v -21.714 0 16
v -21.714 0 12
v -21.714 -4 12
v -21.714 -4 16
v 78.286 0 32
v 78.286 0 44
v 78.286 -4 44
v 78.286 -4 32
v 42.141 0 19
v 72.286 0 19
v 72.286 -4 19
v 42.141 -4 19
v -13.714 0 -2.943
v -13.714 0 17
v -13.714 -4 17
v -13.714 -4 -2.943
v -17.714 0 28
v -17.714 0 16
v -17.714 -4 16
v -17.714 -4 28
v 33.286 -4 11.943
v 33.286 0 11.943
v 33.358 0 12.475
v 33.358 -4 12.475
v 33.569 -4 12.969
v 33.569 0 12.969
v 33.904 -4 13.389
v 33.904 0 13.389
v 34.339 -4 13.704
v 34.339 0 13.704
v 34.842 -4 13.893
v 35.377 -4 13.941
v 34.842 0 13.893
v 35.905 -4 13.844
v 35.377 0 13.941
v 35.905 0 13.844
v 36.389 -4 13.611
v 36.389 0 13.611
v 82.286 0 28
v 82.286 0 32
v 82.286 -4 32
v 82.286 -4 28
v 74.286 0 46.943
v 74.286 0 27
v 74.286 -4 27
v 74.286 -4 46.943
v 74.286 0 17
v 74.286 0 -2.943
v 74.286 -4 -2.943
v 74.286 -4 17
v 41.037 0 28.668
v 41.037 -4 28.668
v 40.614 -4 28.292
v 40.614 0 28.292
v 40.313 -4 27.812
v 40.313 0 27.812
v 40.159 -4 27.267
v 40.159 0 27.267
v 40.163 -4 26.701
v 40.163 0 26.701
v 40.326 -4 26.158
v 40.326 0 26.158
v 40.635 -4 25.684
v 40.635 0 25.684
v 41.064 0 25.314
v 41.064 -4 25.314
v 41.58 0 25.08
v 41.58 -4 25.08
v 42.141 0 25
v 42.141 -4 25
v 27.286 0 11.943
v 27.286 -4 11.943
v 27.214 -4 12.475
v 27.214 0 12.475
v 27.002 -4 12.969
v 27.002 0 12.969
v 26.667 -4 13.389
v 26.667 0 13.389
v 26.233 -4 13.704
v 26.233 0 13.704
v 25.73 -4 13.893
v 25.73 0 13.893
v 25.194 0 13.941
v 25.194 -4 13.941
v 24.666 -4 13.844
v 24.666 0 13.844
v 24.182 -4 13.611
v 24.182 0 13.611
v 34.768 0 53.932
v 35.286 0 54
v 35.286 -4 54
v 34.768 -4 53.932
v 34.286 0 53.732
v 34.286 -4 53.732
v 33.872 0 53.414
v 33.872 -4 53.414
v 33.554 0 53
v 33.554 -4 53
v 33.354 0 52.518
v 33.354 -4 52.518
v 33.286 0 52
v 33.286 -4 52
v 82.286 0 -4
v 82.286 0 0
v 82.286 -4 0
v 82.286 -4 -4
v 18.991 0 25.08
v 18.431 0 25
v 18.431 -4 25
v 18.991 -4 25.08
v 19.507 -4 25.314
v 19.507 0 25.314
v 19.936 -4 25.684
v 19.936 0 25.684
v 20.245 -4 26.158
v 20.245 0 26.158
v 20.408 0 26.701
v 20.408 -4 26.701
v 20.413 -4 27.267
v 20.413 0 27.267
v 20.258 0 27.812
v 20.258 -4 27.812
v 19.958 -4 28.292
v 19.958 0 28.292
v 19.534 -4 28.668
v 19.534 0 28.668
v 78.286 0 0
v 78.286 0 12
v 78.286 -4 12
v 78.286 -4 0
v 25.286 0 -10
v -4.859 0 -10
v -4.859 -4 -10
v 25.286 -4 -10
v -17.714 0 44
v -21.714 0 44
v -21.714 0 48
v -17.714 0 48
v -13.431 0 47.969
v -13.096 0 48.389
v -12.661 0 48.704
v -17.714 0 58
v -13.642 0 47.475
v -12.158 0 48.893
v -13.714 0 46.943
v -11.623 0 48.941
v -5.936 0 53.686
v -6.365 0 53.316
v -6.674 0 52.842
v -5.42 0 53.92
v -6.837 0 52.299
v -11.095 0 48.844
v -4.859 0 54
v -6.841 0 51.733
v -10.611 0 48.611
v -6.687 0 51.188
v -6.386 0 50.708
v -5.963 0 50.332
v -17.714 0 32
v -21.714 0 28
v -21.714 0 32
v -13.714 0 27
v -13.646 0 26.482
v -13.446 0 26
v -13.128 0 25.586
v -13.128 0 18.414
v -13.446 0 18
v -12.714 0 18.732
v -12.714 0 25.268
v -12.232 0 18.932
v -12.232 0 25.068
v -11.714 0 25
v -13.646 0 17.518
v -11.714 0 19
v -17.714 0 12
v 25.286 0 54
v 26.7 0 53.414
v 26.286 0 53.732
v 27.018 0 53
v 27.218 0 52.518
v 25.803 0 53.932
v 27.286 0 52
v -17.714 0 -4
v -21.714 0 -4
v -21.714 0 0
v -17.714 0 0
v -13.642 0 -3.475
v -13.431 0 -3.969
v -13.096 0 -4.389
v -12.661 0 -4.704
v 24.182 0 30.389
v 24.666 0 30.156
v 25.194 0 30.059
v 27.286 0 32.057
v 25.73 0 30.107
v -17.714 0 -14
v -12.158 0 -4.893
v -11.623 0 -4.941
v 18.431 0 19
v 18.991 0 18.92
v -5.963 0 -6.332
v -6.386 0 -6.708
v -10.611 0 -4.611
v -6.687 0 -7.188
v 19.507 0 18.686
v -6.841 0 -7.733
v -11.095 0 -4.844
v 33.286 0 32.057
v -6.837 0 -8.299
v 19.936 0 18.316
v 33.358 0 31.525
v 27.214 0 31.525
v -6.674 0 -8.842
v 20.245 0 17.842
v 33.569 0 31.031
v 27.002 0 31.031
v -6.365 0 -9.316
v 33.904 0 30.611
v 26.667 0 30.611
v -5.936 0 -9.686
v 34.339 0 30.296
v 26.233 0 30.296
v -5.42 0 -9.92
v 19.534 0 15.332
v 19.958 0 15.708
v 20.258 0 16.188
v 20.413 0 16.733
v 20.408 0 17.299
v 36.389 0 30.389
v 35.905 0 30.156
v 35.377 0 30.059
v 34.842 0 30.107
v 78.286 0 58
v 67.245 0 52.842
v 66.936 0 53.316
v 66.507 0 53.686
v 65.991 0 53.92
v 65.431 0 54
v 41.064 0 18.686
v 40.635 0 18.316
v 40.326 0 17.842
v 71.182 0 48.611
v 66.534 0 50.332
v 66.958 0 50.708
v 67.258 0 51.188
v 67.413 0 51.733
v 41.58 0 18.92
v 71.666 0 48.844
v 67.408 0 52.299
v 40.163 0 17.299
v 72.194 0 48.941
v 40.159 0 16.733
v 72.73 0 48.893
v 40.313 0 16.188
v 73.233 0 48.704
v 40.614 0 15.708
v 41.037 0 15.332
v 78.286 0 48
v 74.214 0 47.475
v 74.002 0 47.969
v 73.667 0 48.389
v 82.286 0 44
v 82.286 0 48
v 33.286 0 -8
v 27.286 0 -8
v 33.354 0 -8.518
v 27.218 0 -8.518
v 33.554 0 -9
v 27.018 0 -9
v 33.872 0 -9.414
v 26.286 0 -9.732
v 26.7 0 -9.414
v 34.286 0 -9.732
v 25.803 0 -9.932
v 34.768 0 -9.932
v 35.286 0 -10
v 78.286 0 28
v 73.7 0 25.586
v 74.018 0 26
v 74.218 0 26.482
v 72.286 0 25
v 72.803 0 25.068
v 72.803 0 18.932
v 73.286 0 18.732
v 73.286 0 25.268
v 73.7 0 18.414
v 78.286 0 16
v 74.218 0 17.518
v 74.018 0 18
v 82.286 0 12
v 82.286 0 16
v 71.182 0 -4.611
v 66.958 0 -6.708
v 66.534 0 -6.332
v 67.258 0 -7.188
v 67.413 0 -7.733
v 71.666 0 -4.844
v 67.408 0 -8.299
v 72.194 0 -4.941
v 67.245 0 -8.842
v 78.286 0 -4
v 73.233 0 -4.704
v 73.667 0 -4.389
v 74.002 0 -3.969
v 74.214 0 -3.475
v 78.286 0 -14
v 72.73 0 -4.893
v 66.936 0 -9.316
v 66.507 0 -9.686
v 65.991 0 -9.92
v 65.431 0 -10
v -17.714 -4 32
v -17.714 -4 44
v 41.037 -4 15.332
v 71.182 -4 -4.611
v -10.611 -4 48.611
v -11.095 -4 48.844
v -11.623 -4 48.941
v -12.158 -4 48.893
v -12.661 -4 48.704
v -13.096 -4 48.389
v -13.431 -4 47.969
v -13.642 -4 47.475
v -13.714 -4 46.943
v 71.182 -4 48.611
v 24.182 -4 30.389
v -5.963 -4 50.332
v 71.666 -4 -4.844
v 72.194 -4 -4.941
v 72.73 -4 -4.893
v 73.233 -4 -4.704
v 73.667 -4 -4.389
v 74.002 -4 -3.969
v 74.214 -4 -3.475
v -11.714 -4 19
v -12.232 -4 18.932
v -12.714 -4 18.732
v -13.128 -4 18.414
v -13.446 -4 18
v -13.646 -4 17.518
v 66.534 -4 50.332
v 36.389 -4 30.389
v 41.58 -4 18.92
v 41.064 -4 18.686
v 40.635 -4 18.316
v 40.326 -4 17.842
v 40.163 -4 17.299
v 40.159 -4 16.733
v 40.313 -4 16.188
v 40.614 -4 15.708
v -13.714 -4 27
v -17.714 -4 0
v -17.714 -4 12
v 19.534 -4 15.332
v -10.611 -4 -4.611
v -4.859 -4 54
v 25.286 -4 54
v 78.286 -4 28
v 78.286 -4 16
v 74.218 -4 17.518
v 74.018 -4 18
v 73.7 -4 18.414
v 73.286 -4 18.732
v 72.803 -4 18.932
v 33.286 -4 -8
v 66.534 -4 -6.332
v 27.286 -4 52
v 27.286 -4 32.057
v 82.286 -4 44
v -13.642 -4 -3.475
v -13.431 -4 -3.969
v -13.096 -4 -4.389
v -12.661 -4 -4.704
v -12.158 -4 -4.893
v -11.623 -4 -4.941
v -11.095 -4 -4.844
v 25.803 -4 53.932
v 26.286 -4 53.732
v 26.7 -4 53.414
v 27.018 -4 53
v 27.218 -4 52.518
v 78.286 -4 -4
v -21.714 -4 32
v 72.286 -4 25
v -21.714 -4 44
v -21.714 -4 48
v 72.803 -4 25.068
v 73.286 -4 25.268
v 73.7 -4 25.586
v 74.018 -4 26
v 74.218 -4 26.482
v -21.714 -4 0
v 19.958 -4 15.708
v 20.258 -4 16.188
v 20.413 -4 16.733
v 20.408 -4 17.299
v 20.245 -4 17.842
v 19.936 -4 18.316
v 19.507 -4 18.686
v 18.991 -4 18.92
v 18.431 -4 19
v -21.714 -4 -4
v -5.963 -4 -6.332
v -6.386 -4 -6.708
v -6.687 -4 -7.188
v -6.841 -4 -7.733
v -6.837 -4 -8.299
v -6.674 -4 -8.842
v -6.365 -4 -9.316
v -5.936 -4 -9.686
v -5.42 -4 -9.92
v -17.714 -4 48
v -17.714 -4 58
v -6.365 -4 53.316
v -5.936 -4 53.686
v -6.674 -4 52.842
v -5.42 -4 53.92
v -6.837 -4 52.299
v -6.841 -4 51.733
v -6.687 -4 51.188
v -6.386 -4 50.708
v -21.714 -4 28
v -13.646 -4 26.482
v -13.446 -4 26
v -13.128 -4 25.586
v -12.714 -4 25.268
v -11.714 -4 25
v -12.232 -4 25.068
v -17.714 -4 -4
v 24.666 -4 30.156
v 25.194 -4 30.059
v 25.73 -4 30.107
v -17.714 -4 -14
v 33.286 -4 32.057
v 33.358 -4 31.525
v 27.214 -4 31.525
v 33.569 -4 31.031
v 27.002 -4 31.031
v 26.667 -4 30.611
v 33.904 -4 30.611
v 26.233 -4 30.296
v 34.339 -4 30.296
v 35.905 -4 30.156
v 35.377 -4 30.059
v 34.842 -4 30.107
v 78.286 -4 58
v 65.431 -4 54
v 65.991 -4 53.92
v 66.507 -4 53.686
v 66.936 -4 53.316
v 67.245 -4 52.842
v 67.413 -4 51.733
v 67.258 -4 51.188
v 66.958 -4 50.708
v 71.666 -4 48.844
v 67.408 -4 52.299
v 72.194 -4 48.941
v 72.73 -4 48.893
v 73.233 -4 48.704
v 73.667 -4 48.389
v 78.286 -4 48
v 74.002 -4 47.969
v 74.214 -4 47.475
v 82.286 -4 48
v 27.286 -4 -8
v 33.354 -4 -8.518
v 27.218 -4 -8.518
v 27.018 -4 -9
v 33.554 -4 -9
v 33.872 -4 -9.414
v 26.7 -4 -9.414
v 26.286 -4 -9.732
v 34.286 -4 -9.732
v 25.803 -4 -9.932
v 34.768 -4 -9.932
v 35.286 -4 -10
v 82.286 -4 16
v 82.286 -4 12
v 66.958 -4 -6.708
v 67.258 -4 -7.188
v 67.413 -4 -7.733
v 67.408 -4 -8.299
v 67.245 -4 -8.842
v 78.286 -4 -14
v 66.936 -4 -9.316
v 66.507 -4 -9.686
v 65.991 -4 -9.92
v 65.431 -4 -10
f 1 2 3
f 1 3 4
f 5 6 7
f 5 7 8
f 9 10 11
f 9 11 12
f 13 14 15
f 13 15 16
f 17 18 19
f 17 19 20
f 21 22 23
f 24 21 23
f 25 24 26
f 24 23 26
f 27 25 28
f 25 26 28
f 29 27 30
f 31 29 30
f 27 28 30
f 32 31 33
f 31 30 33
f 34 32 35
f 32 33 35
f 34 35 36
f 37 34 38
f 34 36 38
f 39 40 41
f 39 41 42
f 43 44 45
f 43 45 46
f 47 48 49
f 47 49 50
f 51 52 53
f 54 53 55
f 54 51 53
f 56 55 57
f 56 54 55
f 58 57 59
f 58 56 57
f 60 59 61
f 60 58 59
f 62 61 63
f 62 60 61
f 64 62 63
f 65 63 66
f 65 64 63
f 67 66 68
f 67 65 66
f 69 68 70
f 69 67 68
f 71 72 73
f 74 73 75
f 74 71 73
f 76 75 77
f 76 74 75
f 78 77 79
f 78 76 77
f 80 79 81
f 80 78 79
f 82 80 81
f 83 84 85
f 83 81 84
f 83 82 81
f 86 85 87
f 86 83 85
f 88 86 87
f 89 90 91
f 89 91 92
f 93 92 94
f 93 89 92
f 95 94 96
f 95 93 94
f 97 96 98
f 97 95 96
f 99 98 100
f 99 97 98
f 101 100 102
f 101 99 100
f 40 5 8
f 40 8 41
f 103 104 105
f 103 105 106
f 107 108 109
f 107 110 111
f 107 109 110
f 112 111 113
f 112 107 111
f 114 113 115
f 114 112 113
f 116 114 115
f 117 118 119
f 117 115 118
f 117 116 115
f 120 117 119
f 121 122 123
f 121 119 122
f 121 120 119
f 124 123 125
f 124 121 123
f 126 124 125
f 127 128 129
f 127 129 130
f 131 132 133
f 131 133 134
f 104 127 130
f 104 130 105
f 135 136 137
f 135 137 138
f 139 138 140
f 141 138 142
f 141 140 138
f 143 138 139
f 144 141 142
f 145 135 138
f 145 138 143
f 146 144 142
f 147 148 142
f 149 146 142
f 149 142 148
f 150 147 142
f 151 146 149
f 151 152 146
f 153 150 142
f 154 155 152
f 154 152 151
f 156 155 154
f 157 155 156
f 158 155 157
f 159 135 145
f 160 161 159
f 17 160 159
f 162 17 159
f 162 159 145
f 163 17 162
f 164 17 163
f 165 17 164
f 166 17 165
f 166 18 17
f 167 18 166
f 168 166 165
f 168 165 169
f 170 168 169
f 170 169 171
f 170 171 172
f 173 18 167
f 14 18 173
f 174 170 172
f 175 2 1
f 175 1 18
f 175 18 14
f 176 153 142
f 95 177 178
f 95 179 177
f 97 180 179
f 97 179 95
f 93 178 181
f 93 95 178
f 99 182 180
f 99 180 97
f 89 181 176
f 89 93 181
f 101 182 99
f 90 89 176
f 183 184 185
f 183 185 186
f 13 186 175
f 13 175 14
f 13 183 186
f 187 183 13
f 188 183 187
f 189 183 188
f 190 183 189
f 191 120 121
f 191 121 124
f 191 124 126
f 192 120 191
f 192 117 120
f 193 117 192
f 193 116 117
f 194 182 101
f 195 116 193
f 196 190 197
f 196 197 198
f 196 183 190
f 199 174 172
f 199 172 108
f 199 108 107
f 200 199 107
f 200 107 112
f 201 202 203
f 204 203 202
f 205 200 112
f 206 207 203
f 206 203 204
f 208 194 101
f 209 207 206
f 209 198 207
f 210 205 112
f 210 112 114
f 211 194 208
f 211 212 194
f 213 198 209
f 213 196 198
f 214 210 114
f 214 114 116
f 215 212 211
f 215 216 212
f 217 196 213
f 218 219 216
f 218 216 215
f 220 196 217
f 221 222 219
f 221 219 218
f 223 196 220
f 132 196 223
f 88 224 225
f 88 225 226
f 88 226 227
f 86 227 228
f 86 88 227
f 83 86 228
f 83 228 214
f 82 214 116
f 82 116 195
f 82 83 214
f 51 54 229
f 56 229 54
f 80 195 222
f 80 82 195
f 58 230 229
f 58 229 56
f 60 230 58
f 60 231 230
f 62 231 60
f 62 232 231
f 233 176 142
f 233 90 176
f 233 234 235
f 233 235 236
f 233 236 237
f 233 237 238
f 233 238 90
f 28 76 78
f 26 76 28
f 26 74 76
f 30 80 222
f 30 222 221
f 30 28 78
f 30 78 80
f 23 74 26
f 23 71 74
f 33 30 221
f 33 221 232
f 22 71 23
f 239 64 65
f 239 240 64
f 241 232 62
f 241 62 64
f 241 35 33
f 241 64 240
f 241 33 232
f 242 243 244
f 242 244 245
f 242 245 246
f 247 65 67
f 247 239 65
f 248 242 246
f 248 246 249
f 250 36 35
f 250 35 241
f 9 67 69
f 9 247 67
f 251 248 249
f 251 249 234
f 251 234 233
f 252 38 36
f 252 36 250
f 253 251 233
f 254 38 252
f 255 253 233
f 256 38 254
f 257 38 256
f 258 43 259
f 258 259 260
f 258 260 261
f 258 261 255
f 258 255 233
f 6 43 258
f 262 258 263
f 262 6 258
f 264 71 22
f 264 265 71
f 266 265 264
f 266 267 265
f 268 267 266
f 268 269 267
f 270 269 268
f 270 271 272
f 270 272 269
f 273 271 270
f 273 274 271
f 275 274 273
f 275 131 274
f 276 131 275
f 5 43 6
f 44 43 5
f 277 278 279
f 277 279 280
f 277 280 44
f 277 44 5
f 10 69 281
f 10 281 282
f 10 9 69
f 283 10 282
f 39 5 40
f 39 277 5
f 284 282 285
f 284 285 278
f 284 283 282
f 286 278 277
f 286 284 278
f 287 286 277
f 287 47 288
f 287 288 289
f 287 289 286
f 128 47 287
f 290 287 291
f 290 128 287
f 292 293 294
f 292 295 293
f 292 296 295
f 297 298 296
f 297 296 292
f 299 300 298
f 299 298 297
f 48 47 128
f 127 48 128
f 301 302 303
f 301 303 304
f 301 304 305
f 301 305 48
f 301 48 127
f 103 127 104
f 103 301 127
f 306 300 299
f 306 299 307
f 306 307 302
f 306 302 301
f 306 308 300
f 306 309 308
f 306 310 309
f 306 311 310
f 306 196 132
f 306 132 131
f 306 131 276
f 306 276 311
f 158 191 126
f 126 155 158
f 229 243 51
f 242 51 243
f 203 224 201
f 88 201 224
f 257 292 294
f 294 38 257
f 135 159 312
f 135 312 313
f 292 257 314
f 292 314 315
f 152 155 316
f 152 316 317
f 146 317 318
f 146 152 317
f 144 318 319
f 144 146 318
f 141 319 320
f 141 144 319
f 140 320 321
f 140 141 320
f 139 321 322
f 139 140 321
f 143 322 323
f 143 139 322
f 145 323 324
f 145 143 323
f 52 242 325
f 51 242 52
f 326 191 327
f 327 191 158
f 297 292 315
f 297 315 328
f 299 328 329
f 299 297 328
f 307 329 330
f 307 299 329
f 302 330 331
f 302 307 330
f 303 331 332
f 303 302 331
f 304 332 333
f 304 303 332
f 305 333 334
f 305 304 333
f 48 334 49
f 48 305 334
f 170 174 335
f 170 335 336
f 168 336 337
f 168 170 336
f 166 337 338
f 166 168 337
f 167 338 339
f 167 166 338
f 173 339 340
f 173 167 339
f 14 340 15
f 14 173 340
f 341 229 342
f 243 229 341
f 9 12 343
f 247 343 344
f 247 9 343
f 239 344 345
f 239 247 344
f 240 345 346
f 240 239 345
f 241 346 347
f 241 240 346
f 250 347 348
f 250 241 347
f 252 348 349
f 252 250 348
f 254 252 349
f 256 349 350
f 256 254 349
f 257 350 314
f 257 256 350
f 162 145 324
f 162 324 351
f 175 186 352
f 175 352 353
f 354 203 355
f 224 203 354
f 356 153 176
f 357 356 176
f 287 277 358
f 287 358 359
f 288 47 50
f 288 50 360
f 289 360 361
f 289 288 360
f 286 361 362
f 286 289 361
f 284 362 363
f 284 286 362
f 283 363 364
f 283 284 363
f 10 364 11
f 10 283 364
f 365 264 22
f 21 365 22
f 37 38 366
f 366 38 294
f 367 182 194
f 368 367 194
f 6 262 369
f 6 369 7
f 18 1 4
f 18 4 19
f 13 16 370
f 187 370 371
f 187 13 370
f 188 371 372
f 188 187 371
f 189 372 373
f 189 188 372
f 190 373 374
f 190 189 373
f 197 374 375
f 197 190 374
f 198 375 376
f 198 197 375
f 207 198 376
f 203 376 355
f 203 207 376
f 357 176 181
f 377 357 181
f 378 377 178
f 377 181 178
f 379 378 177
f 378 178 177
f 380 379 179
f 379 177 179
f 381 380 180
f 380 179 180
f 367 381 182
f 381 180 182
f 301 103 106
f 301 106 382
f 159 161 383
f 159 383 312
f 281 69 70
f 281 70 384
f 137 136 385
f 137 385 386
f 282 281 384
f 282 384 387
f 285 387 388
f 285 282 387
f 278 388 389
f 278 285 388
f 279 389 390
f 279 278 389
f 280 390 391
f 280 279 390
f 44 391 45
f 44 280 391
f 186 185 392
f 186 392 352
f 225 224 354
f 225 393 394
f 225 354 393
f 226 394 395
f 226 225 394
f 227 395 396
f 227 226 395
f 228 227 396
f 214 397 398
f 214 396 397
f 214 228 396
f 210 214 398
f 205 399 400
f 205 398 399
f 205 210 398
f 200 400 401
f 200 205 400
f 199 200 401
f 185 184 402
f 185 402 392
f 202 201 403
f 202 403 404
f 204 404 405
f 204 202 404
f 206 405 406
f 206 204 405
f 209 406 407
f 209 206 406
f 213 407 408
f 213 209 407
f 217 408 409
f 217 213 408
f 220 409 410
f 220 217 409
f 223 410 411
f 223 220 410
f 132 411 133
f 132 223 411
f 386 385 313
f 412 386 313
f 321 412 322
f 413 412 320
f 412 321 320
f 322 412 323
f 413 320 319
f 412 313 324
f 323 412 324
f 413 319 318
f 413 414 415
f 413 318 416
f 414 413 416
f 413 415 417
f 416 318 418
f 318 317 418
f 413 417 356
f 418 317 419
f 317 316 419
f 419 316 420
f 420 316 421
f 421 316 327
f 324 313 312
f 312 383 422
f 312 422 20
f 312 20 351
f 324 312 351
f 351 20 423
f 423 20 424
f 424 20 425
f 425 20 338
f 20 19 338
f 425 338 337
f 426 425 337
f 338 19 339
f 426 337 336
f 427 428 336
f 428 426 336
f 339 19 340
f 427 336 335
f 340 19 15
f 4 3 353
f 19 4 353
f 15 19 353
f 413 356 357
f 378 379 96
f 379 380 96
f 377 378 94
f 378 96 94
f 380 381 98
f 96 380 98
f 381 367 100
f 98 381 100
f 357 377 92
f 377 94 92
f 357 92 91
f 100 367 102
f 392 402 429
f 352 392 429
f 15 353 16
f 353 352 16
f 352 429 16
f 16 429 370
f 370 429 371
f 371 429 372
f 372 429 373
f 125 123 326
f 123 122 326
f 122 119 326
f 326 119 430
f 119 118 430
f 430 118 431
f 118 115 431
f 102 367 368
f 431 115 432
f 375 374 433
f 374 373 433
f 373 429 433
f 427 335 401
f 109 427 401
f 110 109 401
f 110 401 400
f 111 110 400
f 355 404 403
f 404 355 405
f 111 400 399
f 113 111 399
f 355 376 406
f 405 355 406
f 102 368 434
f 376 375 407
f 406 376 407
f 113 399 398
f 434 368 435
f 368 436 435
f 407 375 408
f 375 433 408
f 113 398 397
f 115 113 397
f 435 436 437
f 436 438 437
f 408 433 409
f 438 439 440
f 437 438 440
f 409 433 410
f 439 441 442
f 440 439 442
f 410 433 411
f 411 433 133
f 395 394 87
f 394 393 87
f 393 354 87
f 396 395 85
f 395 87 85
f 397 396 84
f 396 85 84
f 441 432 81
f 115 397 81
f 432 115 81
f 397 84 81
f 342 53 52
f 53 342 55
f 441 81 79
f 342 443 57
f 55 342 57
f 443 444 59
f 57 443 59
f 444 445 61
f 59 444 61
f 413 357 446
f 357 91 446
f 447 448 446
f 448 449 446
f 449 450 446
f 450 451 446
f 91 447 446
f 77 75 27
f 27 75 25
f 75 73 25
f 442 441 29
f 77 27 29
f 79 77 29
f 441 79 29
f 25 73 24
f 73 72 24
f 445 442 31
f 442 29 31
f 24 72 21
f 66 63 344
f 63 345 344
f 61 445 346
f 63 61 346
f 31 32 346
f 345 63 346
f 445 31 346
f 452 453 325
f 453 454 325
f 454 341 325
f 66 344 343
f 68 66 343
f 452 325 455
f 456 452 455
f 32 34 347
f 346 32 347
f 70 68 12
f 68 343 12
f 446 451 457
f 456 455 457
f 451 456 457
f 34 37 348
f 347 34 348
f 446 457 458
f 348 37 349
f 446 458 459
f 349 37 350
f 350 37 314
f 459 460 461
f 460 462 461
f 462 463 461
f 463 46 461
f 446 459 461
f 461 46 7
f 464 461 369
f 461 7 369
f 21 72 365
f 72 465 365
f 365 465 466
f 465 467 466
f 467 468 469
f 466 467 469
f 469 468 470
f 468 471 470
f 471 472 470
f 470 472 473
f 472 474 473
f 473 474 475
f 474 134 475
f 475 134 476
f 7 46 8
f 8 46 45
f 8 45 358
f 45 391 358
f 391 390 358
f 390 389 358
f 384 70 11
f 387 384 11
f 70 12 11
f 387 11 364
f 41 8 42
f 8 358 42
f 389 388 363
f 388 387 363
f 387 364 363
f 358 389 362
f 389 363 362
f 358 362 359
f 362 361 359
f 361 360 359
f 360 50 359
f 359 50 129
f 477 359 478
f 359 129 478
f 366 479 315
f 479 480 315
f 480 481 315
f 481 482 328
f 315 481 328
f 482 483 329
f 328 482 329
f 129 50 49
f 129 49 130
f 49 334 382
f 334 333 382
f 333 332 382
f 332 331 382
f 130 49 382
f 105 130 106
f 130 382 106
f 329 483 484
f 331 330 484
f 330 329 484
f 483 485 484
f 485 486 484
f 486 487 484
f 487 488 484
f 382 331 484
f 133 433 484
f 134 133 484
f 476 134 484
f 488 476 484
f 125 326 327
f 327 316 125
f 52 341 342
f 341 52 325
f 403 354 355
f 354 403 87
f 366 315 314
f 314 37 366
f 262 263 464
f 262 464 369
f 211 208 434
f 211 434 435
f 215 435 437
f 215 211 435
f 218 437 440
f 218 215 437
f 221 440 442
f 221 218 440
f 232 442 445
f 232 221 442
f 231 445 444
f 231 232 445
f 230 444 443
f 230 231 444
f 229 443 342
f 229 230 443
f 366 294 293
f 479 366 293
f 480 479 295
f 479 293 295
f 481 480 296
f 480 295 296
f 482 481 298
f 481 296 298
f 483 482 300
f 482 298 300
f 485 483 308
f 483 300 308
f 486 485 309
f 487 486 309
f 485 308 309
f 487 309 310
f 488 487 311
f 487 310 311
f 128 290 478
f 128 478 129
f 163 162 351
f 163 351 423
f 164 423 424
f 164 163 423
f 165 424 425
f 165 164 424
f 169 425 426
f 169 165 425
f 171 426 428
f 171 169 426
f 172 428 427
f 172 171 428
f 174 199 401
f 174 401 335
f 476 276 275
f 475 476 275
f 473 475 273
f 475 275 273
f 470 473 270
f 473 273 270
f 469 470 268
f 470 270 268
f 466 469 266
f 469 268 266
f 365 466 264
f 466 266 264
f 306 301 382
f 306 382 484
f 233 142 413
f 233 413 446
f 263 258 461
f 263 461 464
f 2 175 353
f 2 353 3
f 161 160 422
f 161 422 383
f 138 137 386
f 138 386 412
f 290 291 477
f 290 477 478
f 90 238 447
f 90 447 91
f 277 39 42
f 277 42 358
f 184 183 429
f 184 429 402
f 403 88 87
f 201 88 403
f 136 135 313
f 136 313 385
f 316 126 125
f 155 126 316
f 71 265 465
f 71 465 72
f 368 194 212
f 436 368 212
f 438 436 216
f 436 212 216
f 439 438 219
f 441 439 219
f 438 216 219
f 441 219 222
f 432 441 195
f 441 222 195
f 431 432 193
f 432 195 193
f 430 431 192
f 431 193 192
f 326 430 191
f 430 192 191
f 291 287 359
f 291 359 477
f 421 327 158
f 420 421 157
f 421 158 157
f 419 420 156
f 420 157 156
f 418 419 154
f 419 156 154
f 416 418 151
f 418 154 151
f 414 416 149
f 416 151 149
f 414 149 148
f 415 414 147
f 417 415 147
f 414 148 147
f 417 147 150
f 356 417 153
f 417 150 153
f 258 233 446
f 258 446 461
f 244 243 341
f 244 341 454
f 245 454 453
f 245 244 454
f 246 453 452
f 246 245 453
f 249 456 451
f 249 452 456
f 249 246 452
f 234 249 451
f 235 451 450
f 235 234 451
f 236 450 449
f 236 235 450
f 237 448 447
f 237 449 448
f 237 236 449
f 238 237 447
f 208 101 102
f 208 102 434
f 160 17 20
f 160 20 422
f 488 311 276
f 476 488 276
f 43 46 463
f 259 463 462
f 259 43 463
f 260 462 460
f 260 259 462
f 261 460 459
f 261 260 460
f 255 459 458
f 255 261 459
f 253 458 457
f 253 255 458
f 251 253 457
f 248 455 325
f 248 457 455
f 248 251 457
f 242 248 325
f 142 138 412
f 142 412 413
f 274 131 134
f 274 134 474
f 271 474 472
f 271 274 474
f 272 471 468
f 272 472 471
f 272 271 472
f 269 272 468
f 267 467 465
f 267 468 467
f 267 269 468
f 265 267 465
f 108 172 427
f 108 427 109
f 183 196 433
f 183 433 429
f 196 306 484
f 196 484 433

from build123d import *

# Parameters (mm, degrees)
BOSS_EXTRUDE1_DEPTH = 4
CUT_EXTRUDE1_DEPTH  = 10


with BuildPart() as part:
    # Sketch1 → Boss-Extrude1 (new body)
    with BuildSketch(Plane(origin=(0, 0, 0), x_dir=(1, 0, 0), z_dir=(0, 1, 0))):
        Polygon((-17.714285714, -48), (-17.714285714, -58), (78.285714286, -58), (78.285714286, -48), (82.285714286, -48), (82.285714286, -44), (78.285714286, -44), (78.285714286, -32), (82.285714286, -32), (82.285714286, -28), (78.285714286, -28), (78.285714286, -16), (82.285714286, -16), (82.285714286, -12), (78.285714286, -12), (78.285714286, 0), (82.285714286, 0), (82.285714286, 4), (78.285714286, 4), (78.285714286, 14), (-17.714285714, 14), (-17.714285714, 4), (-21.714285714, 4), (-21.714285714, 0), (-17.714285714, 0), (-17.714285714, -12), (-21.714285714, -12), (-21.714285714, -16), (-17.714285714, -16), (-17.714285714, -28), (-21.714285714, -28), (-21.714285714, -32), (-17.714285714, -32), (-17.714285714, -44), (-21.714285714, -44), (-21.714285714, -48), align=None)
    extrude(amount=-BOSS_EXTRUDE1_DEPTH)

    # Sketch2 → Cut-Extrude1 (cut)
    with BuildSketch(Plane(origin=(0, 0, 0), x_dir=(1, 0, 0), z_dir=(0, 1, 0))):
        with BuildLine():
            ThreePointArc((-13.714285714, 2.94278394), (-12.661123549, 4.704458744), (-10.6107876, 4.610804297))
            Line((-10.6107876, 4.610804297), (19.53422954, -15.331979643))
            ThreePointArc((19.53422954, -15.331979643), (20.345939079, -17.576176746), (18.430731426, -19))
            Line((18.430731426, -19), (-11.714285714, -19))
            ThreePointArc((-11.714285714, -19), (-13.128499277, -18.414213562), (-13.714285714, -17))
            Line((-13.714285714, -17), (-13.714285714, 2.94278394))
        make_face()
        with BuildLine():
            Line((-4.859302854, 10), (25.285714286, 10))
            ThreePointArc((25.285714286, 10), (26.699927848, 9.414213562), (27.285714286, 8))
            Line((27.285714286, 8), (27.285714286, -11.94278394))
            ThreePointArc((27.285714286, -11.94278394), (26.23255212, -13.704458744), (24.182216171, -13.610804297))
            Line((24.182216171, -13.610804297), (-5.962800969, 6.331979643))
            ThreePointArc((-5.962800969, 6.331979643), (-6.774510508, 8.576176746), (-4.859302854, 10))
        make_face()
        with BuildLine():
            Line((33.285714286, 8), (33.285714286, -11.94278394))
            ThreePointArc((33.285714286, -11.94278394), (34.338876451, -13.704458744), (36.3892124, -13.610804297))
            Line((36.3892124, -13.610804297), (66.53422954, 6.331979643))
            ThreePointArc((66.53422954, 6.331979643), (67.345939079, 8.576176746), (65.430731426, 10))
            Line((65.430731426, 10), (35.285714286, 10))
            ThreePointArc((35.285714286, 10), (33.871500723, 9.414213562), (33.285714286, 8))
        make_face()
        with BuildLine():
            ThreePointArc((74.285714286, -17), (73.699927848, -18.414213562), (72.285714286, -19))
            Line((72.285714286, -19), (42.140697146, -19))
            ThreePointArc((42.140697146, -19), (40.225489492, -17.576176746), (41.037199031, -15.331979643))
            Line((41.037199031, -15.331979643), (71.182216171, 4.610804297))
            ThreePointArc((71.182216171, 4.610804297), (73.23255212, 4.704458744), (74.285714286, 2.94278394))
            Line((74.285714286, 2.94278394), (74.285714286, -17))
        make_face()
        with BuildLine():
            ThreePointArc((74.285714286, -46.94278394), (73.23255212, -48.704458744), (71.182216171, -48.610804297))
            Line((71.182216171, -48.610804297), (41.037199031, -28.668020357))
            ThreePointArc((41.037199031, -28.668020357), (40.225489492, -26.423823254), (42.140697146, -25))
            Line((42.140697146, -25), (72.285714286, -25))
            ThreePointArc((72.285714286, -25), (73.699927848, -25.585786438), (74.285714286, -27))
            Line((74.285714286, -27), (74.285714286, -46.94278394))
        make_face()
        with BuildLine():
            Line((65.430731426, -54), (35.285714286, -54))
            ThreePointArc((35.285714286, -54), (33.871500723, -53.414213562), (33.285714286, -52))
            Line((33.285714286, -52), (33.285714286, -32.05721606))
            ThreePointArc((33.285714286, -32.05721606), (34.338876451, -30.295541256), (36.3892124, -30.389195703))
            Line((36.3892124, -30.389195703), (66.53422954, -50.331979643))
            ThreePointArc((66.53422954, -50.331979643), (67.345939079, -52.576176746), (65.430731426, -54))
        make_face()
        with BuildLine():
            Line((27.285714286, -52), (27.285714286, -32.05721606))
            ThreePointArc((27.285714286, -32.05721606), (26.23255212, -30.295541256), (24.182216171, -30.389195703))
            Line((24.182216171, -30.389195703), (-5.962800969, -50.331979643))
            ThreePointArc((-5.962800969, -50.331979643), (-6.774510508, -52.576176746), (-4.859302854, -54))
            Line((-4.859302854, -54), (25.285714286, -54))
            ThreePointArc((25.285714286, -54), (26.699927848, -53.414213562), (27.285714286, -52))
        make_face()
        with BuildLine():
            ThreePointArc((-13.714285714, -27), (-13.128499277, -25.585786438), (-11.714285714, -25))
            Line((-11.714285714, -25), (18.430731426, -25))
            ThreePointArc((18.430731426, -25), (20.345939079, -26.423823254), (19.53422954, -28.668020357))
            Line((19.53422954, -28.668020357), (-10.6107876, -48.610804297))
            ThreePointArc((-10.6107876, -48.610804297), (-12.661123549, -48.704458744), (-13.714285714, -46.94278394))
            Line((-13.714285714, -46.94278394), (-13.714285714, -27))
        make_face()
    extrude(amount=-CUT_EXTRUDE1_DEPTH, mode=Mode.SUBTRACT)


solid = part.part
